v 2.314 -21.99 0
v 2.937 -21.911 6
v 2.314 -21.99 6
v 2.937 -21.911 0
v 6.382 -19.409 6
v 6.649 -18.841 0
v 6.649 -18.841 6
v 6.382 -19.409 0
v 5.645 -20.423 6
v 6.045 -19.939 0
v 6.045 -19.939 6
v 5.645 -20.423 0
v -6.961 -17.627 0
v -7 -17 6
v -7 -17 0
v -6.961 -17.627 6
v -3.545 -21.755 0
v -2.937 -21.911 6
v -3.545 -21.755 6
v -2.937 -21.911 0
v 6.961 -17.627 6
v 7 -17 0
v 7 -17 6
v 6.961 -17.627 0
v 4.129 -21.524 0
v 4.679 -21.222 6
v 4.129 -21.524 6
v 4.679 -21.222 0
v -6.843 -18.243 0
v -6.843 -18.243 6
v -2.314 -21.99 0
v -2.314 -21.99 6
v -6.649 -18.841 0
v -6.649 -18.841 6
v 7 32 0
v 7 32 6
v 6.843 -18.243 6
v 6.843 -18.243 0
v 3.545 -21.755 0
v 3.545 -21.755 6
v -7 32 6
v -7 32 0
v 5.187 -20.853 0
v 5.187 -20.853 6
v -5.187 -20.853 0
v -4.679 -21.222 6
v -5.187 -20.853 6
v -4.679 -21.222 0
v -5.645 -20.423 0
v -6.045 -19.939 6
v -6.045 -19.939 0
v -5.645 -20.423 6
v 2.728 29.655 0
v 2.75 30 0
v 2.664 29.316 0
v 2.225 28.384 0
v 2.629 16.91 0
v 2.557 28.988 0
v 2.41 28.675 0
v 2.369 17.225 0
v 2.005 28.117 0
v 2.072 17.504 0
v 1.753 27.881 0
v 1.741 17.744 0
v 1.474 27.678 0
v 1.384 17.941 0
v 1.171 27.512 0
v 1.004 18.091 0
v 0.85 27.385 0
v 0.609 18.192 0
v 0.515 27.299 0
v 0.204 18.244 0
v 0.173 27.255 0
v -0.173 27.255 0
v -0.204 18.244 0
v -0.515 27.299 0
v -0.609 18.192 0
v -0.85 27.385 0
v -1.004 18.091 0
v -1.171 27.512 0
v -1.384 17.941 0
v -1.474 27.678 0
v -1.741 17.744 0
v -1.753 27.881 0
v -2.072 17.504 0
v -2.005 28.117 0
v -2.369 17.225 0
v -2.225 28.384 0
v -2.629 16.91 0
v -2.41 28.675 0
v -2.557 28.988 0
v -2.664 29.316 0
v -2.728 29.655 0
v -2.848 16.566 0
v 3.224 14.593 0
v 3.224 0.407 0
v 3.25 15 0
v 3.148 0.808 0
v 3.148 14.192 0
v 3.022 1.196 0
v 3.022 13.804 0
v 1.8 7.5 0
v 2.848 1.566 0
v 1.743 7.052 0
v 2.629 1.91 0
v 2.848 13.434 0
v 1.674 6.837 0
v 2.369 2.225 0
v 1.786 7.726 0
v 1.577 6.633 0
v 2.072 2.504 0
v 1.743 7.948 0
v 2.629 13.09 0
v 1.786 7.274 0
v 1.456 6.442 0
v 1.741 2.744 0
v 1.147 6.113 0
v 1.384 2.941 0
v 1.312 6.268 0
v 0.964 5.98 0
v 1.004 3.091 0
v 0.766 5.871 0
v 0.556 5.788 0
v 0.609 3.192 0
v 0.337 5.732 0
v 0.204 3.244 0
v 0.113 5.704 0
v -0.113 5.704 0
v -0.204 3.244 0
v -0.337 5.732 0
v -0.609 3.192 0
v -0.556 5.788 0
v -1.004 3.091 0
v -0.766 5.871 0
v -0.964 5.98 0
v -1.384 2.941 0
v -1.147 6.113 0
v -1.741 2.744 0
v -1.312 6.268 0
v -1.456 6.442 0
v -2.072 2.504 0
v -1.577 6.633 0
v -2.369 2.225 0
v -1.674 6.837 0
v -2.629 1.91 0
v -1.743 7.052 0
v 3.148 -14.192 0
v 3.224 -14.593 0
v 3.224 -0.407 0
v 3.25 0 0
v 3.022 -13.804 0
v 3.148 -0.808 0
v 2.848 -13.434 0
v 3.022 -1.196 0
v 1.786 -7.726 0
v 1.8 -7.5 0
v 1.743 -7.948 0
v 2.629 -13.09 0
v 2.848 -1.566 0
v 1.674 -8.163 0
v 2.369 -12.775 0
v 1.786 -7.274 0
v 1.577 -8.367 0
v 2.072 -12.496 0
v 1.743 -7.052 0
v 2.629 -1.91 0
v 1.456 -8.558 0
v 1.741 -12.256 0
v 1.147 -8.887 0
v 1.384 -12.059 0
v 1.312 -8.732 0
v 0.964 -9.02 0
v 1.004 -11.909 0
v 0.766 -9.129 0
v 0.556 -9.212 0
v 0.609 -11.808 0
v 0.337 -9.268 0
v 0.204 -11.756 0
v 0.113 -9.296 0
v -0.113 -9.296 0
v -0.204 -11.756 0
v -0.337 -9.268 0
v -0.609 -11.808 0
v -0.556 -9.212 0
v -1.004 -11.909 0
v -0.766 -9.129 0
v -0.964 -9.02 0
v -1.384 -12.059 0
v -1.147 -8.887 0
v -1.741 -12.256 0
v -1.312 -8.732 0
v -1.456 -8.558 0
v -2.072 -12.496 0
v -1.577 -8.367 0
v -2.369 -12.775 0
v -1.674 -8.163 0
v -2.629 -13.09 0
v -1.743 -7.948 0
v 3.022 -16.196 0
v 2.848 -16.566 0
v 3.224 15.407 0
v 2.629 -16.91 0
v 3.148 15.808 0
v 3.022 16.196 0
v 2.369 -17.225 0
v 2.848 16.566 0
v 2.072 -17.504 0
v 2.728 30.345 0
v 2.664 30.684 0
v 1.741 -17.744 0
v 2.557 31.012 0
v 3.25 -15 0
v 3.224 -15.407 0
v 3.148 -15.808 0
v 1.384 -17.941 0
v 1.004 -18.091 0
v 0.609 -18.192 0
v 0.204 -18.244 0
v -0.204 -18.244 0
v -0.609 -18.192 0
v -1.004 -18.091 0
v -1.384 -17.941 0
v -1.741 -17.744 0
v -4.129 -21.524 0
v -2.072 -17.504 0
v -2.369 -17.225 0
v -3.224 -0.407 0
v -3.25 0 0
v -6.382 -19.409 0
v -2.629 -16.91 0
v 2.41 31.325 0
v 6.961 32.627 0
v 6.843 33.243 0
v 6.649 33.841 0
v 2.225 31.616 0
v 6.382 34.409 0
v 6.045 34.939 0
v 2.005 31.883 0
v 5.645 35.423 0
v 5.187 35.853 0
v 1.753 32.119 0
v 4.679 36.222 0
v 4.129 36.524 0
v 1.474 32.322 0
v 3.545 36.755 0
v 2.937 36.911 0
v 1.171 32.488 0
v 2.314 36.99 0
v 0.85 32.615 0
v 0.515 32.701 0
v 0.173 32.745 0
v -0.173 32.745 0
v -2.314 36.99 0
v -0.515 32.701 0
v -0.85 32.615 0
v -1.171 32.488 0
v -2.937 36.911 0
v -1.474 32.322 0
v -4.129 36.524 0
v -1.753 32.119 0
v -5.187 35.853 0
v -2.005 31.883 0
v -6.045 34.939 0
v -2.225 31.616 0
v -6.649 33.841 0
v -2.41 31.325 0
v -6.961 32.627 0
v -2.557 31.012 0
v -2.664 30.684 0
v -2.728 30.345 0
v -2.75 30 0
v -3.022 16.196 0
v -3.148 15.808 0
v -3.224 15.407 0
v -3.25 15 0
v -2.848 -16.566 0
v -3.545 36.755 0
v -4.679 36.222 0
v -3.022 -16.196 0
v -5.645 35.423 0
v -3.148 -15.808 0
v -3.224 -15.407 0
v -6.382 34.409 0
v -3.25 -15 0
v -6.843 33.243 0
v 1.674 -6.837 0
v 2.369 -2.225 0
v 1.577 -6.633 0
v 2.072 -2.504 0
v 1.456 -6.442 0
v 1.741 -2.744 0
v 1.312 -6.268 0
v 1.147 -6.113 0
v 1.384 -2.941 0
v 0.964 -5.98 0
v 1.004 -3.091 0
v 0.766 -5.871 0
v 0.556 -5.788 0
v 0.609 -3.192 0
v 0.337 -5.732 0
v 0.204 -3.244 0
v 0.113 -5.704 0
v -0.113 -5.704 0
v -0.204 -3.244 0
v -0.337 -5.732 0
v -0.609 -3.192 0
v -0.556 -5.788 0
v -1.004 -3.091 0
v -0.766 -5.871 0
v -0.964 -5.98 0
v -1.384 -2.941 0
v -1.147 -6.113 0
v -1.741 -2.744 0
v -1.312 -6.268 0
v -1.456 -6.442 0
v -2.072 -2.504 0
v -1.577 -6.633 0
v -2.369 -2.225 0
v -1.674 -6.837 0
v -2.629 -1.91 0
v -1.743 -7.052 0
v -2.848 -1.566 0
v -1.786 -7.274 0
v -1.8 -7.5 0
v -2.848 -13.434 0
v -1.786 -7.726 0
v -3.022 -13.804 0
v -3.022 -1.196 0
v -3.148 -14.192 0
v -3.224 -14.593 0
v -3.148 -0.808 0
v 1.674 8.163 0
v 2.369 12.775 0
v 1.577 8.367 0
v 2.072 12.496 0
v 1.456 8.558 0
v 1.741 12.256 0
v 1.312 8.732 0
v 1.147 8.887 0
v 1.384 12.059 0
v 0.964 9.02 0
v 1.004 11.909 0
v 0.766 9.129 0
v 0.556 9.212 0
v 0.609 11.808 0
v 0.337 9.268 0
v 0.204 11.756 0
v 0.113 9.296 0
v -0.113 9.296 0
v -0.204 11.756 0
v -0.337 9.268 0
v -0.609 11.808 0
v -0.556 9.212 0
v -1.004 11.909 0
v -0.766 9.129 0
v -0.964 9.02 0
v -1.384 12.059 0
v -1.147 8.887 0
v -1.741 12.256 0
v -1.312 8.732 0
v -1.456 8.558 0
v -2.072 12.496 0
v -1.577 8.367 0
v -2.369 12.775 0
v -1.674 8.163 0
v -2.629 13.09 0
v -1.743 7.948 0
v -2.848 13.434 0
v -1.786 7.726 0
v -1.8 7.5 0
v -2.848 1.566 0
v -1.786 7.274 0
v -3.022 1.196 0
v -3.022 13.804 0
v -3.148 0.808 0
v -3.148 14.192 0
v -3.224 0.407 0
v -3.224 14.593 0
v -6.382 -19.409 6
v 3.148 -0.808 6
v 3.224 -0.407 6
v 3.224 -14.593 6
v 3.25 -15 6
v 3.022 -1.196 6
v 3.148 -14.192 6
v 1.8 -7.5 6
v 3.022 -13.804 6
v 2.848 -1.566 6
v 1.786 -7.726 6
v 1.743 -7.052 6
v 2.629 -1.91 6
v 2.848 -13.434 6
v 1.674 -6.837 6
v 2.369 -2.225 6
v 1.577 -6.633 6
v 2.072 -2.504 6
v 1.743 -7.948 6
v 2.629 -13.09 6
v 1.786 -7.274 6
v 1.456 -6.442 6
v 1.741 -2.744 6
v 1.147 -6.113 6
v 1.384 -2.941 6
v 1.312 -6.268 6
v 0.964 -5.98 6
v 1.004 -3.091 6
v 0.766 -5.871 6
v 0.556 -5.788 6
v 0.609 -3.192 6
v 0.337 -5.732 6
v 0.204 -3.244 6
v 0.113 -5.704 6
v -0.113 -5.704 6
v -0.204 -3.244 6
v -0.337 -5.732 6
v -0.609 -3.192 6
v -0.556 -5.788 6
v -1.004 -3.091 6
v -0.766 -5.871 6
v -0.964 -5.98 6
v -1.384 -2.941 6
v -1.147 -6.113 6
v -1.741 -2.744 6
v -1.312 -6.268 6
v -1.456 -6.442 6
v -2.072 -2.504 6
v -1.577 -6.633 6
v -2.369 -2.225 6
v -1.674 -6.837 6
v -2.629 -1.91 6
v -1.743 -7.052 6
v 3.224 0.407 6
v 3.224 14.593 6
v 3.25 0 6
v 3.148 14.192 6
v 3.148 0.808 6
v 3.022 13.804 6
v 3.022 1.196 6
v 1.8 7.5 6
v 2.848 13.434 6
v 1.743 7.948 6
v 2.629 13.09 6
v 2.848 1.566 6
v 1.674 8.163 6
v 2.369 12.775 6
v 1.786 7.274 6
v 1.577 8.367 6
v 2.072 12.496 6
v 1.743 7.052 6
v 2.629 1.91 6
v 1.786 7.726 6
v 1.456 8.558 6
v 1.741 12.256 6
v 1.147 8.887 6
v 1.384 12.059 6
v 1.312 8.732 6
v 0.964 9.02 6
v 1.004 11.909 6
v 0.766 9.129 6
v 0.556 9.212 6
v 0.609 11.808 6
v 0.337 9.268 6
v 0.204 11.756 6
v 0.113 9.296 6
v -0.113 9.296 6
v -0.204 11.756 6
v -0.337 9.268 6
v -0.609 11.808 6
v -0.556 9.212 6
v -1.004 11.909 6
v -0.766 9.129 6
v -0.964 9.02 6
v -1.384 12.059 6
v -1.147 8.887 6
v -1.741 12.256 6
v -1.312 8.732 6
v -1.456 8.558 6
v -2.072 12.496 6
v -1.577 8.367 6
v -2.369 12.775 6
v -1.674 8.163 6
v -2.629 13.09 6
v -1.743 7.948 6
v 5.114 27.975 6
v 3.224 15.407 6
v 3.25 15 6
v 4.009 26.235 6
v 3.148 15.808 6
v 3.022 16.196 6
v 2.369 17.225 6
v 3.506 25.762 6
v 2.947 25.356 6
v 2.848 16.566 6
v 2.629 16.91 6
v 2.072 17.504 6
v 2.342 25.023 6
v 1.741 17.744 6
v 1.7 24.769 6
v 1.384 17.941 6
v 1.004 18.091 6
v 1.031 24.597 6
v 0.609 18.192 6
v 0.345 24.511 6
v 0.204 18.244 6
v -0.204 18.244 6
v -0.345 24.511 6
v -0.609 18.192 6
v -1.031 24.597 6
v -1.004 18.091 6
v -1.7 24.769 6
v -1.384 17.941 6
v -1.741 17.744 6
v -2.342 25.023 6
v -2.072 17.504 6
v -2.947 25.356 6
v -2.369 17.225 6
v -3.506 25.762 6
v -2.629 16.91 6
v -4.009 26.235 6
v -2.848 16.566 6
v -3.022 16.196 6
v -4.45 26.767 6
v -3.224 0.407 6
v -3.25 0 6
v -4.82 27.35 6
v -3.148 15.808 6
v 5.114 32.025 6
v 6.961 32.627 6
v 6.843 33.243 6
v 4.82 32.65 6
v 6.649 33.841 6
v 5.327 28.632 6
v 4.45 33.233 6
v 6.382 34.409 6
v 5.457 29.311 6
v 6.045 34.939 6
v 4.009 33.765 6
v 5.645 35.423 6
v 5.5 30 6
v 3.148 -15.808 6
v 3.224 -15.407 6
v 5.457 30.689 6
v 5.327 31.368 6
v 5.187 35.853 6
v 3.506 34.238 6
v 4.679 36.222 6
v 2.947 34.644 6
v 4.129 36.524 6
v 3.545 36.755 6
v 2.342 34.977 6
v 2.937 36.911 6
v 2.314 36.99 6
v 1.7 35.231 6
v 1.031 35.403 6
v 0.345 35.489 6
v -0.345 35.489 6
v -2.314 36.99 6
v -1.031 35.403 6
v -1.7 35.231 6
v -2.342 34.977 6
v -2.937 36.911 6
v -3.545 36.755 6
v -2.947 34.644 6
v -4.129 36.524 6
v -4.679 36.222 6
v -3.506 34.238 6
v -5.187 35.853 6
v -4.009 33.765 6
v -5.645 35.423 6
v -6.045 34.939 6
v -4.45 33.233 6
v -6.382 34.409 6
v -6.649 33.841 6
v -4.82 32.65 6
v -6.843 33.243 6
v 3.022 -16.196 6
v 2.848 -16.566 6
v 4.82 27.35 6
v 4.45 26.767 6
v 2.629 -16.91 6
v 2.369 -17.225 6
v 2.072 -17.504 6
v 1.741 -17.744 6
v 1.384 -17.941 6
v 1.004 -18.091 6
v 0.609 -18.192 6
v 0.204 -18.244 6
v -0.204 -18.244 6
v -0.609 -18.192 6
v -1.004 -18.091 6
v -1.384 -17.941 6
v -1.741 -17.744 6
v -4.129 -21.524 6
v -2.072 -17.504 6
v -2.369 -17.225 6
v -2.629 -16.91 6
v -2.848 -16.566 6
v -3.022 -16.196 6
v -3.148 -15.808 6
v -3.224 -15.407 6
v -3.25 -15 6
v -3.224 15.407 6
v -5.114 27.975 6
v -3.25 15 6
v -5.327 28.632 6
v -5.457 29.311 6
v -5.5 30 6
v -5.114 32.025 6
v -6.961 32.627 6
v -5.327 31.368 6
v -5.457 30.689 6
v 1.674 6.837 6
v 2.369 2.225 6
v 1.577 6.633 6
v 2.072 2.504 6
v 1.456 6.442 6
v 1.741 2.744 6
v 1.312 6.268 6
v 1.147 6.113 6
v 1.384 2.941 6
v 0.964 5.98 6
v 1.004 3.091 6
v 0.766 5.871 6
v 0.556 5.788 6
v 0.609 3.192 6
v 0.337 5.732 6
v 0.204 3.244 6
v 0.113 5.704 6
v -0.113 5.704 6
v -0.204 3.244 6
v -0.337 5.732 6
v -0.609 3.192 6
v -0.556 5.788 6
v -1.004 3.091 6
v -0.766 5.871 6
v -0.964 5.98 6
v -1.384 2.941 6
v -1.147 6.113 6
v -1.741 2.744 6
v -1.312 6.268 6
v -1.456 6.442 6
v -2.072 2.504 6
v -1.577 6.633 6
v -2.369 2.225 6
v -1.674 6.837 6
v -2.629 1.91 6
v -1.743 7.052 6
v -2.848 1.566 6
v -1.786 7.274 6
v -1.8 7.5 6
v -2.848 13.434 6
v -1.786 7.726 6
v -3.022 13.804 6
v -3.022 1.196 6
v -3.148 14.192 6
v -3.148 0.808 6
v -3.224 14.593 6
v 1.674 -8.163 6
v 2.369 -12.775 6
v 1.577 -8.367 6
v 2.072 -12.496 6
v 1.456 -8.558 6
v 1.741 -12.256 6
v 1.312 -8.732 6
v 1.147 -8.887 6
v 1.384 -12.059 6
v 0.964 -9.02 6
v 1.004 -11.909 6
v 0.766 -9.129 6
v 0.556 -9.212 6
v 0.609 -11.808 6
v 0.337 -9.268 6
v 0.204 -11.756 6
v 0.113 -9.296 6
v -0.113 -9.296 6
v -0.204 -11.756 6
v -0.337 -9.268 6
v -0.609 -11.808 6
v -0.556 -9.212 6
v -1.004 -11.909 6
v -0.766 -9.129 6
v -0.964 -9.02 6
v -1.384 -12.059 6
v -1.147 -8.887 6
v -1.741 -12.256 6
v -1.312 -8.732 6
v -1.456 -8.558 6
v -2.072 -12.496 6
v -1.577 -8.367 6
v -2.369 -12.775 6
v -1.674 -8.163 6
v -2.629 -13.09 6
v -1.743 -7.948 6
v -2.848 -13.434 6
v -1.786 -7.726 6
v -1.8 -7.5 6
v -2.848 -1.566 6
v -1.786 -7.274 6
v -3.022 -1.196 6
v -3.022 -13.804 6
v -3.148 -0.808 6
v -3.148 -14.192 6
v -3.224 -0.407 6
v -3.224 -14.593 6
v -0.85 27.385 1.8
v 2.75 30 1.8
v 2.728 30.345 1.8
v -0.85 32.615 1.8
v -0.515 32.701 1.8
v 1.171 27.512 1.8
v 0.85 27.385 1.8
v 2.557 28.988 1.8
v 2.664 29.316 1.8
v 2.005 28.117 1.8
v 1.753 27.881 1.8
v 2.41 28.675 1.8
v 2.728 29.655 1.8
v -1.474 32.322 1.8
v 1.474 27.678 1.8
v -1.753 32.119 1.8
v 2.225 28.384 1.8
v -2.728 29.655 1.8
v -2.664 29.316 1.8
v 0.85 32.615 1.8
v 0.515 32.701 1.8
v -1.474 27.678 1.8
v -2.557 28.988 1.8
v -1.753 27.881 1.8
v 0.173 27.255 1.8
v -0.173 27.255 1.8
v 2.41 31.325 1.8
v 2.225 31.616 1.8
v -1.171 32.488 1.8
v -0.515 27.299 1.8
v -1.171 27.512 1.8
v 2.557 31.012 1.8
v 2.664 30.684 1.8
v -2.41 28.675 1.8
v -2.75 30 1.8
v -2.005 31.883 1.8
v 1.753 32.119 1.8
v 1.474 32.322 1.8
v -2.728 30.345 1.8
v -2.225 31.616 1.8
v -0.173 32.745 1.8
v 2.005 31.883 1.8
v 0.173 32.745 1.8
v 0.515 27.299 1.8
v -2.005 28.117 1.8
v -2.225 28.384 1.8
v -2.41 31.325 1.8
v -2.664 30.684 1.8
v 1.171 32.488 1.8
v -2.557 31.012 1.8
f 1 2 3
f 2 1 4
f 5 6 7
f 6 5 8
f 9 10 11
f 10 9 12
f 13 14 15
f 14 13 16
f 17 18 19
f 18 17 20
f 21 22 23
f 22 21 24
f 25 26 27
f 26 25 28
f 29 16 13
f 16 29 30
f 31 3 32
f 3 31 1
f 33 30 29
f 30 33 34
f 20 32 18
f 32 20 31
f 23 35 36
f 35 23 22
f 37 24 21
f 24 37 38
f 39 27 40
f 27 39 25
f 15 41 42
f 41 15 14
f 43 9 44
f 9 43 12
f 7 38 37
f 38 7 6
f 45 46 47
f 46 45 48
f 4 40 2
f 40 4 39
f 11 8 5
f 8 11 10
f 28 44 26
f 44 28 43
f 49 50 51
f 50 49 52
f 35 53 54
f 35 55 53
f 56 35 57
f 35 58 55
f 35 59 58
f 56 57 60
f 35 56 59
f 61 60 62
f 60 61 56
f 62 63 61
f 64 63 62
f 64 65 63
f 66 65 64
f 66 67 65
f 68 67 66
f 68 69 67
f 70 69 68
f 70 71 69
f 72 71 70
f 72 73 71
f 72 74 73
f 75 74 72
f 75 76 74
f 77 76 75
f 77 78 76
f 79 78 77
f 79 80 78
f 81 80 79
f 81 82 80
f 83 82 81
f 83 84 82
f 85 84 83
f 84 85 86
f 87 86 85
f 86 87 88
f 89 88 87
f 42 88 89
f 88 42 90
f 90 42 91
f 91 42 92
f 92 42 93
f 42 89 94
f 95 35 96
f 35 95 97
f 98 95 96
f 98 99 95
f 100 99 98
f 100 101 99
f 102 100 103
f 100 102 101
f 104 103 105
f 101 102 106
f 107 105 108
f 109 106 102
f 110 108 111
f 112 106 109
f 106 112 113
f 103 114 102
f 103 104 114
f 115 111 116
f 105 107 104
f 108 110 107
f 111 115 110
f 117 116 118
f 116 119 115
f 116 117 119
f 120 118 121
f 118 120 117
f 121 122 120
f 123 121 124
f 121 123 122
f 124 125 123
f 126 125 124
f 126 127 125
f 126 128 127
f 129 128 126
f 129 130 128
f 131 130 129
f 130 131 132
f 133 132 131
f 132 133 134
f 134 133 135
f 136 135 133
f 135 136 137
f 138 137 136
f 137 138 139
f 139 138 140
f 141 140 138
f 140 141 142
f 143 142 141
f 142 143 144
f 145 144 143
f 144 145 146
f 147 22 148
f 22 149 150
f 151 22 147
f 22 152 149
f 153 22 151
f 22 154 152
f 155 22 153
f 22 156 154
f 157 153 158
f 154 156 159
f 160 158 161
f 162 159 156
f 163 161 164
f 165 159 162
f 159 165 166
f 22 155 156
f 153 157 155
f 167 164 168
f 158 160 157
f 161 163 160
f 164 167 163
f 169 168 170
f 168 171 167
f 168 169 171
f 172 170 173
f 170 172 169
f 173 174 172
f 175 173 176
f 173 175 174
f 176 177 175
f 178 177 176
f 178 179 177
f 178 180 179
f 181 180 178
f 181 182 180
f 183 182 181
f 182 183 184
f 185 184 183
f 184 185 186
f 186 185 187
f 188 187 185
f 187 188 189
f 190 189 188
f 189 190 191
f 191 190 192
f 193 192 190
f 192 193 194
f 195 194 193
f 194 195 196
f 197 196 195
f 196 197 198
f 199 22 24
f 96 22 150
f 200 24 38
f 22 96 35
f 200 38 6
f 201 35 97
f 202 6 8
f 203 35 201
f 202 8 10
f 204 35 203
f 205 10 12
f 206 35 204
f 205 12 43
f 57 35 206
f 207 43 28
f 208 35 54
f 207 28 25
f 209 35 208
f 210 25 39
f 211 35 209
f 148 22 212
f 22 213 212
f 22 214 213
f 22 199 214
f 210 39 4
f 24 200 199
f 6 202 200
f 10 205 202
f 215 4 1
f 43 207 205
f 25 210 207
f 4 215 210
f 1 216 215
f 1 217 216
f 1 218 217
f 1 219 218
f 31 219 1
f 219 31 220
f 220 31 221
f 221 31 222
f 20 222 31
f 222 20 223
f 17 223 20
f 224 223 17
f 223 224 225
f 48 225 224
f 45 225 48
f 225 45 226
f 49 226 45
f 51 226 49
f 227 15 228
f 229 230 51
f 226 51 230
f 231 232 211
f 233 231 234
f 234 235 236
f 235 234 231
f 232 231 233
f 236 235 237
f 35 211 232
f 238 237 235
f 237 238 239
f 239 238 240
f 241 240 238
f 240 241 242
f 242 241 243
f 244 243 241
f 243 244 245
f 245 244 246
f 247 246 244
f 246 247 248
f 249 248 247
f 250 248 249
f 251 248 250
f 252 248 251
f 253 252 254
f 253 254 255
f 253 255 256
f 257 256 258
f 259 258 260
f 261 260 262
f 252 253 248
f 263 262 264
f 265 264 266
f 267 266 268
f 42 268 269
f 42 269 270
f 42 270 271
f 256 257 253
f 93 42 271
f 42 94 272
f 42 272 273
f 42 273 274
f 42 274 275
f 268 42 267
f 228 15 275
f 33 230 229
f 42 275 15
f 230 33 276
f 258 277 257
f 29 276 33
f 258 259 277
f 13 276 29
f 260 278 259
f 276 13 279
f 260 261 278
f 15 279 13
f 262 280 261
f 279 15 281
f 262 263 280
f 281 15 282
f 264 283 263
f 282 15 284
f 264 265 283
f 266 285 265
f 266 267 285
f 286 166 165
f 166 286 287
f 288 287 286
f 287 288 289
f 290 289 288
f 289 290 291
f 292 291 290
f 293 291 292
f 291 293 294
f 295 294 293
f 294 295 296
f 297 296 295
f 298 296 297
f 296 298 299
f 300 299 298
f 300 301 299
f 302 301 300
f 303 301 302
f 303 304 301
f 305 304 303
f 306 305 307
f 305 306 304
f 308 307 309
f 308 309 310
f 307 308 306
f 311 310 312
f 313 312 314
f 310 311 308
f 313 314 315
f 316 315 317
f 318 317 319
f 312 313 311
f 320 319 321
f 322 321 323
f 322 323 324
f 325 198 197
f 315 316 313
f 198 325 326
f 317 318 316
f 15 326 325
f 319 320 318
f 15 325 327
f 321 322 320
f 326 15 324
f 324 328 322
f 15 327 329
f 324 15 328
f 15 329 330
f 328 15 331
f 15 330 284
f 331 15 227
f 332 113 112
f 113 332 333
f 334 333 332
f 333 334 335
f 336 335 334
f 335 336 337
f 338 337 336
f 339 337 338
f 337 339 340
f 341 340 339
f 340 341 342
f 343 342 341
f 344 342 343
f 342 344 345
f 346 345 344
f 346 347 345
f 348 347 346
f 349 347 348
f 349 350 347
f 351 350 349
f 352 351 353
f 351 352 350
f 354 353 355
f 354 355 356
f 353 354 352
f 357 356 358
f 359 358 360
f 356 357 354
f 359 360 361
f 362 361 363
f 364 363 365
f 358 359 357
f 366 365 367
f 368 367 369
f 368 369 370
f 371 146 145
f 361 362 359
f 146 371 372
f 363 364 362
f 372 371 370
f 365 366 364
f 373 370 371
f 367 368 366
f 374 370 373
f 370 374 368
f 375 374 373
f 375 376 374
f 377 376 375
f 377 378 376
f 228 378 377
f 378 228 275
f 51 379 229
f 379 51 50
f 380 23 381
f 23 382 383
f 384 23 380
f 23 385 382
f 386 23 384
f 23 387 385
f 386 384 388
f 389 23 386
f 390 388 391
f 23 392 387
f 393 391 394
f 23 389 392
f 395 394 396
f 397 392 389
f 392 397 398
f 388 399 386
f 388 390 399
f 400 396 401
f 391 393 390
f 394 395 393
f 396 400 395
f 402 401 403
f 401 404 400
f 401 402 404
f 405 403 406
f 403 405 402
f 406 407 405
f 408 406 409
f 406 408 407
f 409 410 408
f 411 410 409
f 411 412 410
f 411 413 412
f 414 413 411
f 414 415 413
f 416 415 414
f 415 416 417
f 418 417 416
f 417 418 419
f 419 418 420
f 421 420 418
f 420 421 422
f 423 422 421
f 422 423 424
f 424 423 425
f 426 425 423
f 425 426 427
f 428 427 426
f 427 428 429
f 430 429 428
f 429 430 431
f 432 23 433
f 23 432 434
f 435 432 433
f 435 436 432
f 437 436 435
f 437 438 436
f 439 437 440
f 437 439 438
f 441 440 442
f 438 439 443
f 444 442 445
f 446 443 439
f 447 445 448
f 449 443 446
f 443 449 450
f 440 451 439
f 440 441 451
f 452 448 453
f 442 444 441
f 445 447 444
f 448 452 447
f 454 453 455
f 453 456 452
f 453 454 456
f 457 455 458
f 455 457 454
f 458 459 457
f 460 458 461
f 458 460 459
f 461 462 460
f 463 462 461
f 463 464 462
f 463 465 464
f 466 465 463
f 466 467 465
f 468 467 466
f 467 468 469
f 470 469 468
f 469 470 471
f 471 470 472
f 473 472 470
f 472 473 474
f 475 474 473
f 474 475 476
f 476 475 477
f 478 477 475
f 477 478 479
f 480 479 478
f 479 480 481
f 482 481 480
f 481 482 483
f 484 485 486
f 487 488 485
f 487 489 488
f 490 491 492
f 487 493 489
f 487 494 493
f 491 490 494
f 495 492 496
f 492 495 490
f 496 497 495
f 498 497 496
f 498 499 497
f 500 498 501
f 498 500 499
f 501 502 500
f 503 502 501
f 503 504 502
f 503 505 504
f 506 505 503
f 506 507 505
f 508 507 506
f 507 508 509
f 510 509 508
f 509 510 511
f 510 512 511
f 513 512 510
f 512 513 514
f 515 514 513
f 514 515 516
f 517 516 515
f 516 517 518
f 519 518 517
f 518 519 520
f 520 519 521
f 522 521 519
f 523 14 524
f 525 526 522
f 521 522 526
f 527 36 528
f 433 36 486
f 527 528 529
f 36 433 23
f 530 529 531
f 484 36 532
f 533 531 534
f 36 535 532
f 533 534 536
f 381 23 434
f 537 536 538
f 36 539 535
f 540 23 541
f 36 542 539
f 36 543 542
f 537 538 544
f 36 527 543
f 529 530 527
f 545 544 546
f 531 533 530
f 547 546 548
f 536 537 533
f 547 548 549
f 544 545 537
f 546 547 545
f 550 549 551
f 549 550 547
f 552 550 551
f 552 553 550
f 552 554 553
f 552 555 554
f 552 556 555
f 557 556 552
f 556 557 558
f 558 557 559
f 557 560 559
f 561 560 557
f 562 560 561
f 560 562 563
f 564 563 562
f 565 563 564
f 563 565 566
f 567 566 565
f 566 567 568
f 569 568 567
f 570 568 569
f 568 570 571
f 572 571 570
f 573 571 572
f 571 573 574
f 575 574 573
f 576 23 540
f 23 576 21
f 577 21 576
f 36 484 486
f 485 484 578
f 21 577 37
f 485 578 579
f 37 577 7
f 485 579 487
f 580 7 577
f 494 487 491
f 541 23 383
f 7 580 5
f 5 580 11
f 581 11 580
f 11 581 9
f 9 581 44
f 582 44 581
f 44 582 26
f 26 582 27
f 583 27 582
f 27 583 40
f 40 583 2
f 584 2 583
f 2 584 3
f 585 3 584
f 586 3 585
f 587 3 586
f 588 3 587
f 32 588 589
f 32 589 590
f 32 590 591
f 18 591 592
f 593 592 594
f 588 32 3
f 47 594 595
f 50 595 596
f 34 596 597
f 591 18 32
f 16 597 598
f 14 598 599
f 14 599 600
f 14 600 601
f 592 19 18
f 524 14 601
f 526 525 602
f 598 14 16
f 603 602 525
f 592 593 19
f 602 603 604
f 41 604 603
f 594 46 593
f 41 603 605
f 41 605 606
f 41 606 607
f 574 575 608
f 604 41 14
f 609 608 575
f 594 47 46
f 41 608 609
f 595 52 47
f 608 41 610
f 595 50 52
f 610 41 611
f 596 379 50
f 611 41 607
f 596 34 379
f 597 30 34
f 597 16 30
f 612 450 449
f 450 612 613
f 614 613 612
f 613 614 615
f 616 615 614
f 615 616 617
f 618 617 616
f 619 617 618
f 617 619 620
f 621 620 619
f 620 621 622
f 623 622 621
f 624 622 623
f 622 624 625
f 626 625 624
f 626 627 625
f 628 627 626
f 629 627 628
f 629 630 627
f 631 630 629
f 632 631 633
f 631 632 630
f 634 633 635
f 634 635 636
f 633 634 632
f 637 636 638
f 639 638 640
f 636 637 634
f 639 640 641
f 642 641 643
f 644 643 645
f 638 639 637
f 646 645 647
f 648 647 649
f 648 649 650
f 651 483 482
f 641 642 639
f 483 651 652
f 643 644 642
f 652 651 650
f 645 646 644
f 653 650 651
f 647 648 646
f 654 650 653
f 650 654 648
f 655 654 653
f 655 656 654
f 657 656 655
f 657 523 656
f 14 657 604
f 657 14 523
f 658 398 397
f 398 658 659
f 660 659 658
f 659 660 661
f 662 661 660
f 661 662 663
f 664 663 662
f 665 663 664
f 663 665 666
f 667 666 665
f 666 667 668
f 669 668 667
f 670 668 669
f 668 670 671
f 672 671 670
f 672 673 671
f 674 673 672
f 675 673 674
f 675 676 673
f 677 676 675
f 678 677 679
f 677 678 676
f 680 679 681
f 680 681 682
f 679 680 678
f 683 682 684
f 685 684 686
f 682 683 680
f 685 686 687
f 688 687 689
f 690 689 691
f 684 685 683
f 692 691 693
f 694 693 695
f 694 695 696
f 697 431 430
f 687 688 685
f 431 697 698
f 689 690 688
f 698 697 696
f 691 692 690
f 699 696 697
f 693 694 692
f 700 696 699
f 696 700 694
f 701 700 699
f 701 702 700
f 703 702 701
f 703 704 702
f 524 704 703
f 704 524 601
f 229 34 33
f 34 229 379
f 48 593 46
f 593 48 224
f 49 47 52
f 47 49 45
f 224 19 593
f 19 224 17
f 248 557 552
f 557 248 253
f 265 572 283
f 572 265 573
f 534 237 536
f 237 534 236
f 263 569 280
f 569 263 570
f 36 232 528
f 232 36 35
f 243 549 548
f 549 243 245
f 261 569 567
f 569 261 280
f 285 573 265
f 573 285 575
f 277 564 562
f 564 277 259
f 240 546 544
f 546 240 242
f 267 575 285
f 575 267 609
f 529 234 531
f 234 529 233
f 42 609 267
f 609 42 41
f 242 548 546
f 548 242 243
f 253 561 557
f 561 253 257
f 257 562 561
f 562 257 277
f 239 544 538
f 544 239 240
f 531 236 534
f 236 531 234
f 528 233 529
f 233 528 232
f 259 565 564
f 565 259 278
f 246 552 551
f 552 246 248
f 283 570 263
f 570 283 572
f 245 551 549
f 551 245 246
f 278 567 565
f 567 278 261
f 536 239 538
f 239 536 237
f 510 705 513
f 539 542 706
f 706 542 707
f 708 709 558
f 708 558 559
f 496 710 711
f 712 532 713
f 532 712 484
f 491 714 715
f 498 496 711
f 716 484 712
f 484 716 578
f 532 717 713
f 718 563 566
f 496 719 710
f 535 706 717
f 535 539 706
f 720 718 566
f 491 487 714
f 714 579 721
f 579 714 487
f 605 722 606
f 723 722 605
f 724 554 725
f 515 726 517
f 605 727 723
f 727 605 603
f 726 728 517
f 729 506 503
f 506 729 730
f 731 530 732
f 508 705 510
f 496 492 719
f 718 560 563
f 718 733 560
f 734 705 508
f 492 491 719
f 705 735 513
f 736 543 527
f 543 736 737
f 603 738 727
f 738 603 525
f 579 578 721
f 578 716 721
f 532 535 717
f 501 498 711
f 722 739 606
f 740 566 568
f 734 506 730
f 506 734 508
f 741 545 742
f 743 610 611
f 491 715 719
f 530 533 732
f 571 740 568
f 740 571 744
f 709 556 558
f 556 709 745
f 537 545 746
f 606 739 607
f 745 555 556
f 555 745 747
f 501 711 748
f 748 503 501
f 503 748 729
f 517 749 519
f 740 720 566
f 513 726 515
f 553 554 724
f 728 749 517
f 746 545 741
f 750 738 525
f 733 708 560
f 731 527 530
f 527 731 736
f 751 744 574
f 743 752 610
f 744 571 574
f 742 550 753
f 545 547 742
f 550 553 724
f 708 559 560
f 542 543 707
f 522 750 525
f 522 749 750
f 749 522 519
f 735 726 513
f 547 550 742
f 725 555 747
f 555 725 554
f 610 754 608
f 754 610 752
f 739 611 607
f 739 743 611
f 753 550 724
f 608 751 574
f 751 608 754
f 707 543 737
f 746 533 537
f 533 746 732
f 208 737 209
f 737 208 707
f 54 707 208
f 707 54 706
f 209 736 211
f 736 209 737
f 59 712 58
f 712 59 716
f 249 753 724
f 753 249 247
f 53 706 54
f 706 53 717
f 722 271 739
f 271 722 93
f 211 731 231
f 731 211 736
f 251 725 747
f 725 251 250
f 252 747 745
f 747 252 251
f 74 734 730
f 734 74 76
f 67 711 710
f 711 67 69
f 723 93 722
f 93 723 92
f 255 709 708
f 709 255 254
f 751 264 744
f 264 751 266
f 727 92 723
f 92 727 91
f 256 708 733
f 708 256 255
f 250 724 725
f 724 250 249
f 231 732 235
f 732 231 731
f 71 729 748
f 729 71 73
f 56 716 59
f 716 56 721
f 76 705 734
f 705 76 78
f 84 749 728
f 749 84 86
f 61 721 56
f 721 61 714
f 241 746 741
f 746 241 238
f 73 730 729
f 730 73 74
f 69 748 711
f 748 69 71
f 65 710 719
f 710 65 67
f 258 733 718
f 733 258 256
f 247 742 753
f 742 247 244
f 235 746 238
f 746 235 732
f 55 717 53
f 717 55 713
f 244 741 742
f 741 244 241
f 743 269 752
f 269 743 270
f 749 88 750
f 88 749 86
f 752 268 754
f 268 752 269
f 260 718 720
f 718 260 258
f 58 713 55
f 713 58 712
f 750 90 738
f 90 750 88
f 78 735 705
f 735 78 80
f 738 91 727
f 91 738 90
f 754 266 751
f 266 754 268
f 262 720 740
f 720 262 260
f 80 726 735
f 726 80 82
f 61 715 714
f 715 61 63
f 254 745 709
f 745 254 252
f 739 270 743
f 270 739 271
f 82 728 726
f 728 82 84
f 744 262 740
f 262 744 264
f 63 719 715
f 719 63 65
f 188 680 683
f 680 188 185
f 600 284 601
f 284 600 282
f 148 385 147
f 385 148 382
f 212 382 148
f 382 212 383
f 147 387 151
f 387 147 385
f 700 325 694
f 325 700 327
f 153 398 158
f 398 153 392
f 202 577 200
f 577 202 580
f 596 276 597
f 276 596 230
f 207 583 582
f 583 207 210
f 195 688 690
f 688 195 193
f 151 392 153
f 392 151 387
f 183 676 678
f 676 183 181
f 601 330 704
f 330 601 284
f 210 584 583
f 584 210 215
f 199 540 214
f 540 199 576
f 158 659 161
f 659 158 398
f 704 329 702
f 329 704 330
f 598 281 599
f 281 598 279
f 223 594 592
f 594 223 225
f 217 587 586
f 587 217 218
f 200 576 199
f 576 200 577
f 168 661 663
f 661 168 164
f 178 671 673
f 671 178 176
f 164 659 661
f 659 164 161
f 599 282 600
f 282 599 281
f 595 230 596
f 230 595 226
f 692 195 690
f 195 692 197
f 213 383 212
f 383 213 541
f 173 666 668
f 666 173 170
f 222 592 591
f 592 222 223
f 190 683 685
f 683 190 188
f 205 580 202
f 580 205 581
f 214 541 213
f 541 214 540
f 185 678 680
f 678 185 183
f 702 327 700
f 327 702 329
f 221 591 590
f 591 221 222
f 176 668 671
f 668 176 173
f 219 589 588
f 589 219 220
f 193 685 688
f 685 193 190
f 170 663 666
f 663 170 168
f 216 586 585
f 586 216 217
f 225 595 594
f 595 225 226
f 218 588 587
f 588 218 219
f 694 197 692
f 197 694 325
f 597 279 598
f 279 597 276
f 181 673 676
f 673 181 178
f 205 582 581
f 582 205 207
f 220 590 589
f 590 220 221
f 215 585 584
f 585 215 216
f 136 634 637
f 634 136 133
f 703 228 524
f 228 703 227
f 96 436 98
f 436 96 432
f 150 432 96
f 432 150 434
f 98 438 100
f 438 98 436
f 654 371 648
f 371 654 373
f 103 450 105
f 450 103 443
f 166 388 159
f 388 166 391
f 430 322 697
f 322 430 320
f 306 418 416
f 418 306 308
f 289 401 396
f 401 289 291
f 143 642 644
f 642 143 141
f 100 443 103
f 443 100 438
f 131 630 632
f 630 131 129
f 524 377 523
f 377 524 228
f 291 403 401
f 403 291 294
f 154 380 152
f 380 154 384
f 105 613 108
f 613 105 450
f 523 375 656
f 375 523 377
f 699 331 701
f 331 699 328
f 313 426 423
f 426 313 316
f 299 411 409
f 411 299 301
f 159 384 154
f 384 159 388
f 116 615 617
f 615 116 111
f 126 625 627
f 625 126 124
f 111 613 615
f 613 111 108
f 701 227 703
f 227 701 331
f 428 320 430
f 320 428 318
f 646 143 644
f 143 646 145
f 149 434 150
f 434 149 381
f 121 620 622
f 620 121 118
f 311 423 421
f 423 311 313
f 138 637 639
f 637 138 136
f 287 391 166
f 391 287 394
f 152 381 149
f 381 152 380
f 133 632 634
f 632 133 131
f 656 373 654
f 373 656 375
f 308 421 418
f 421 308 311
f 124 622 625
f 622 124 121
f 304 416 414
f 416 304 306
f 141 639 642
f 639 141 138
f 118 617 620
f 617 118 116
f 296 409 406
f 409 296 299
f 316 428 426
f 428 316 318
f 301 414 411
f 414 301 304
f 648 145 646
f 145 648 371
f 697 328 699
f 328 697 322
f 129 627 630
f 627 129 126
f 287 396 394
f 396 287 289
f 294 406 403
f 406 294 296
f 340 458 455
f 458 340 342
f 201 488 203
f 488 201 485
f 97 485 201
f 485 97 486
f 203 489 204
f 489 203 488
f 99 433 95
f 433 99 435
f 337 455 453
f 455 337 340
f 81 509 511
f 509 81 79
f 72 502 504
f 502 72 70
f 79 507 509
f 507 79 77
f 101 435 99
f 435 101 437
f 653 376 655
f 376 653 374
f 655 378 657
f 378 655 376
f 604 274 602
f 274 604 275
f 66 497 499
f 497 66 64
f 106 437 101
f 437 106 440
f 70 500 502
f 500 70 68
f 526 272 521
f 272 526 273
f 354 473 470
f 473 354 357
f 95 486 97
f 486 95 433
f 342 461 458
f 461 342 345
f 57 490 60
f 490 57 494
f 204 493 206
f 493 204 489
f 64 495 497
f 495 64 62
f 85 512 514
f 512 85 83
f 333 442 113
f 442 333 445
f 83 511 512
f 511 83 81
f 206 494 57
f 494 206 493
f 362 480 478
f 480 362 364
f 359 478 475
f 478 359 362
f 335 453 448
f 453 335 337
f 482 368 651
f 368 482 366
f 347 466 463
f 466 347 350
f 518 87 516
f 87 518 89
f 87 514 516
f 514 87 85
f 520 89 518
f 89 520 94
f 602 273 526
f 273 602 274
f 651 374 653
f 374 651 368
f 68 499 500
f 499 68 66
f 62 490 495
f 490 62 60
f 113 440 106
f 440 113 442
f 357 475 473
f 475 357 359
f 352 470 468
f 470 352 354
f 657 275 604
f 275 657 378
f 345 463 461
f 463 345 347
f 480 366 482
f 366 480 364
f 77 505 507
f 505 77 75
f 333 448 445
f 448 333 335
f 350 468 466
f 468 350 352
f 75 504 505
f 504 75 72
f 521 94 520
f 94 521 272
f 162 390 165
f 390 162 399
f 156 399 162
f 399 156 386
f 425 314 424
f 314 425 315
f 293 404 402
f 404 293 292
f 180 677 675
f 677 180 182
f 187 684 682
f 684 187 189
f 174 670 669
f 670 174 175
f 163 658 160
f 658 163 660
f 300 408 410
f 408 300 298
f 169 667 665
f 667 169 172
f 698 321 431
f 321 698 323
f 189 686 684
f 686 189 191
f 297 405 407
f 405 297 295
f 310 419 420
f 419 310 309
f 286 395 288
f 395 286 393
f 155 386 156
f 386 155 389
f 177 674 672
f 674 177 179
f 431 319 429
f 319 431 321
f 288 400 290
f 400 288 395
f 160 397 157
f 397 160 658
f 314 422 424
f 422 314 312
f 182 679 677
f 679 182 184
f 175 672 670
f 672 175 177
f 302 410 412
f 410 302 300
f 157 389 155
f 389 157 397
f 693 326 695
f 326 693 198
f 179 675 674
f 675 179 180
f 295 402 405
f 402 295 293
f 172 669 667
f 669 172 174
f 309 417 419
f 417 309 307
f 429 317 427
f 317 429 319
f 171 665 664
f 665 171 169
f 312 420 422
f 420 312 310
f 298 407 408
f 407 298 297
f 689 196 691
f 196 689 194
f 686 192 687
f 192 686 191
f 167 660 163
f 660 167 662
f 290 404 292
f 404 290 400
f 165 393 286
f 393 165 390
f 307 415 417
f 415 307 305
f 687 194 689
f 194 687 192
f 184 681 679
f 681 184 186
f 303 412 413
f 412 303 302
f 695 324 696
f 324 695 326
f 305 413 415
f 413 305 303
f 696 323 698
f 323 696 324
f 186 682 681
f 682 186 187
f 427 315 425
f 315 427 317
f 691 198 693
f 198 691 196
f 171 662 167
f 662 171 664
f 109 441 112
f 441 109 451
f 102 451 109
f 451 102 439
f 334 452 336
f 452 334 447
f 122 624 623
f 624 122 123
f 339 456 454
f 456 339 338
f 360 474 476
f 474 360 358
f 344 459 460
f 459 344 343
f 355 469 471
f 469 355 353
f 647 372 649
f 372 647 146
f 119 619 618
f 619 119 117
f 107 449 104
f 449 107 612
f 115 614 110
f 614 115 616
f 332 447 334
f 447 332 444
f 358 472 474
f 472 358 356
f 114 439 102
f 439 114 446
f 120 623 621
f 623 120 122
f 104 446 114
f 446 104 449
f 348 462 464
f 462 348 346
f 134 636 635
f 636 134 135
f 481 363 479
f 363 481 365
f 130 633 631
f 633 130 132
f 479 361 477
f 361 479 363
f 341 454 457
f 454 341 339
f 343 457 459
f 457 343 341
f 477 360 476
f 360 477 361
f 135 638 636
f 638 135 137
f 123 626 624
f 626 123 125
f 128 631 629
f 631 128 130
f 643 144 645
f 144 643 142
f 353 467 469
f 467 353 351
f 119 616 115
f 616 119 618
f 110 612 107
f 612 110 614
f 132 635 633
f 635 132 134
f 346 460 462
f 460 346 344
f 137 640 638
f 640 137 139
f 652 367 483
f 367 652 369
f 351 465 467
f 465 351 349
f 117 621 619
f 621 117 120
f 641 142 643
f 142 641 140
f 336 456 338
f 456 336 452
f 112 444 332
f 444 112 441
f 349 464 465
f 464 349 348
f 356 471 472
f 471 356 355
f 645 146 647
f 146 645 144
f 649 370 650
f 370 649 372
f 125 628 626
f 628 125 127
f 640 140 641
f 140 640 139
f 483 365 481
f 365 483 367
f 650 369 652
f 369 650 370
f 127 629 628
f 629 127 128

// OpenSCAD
$fn = 50;


difference() {
	union() {
		hull() {
			translate(v = [-2.0000000000, 17.0000000000, 0]) {
				cylinder(h = 6, r = 5);
			}
			translate(v = [2.0000000000, 17.0000000000, 0]) {
				cylinder(h = 6, r = 5);
			}
			translate(v = [-2.0000000000, -17.0000000000, 0]) {
				cylinder(h = 6, r = 5);
			}
			translate(v = [2.0000000000, -17.0000000000, 0]) {
				cylinder(h = 6, r = 5);
			}
		}
		translate(v = [0.0000000000, 22.5000000000, 0]) {
			hull() {
				translate(v = [-2.0000000000, 9.5000000000, 0]) {
					cylinder(h = 6, r = 5);
				}
				translate(v = [2.0000000000, 9.5000000000, 0]) {
					cylinder(h = 6, r = 5);
				}
				translate(v = [-2.0000000000, -9.5000000000, 0]) {
					cylinder(h = 6, r = 5);
				}
				translate(v = [2.0000000000, -9.5000000000, 0]) {
					cylinder(h = 6, r = 5);
				}
			}
		}
		translate(v = [0.0000000000, 22.5000000000, 0]) {
			hull() {
				translate(v = [-2.0000000000, 9.5000000000, 0]) {
					cylinder(h = 6, r = 5);
				}
				translate(v = [2.0000000000, 9.5000000000, 0]) {
					cylinder(h = 6, r = 5);
				}
				translate(v = [-2.0000000000, -9.5000000000, 0]) {
					cylinder(h = 6, r = 5);
				}
				translate(v = [2.0000000000, -9.5000000000, 0]) {
					cylinder(h = 6, r = 5);
				}
			}
		}
	}
	union() {
		translate(v = [0.0000000000, 30.0000000000, 6]) {
			rotate(a = [0, 0, 0]) {
				difference() {
					union() {
						#translate(v = [0, 0, -6.0000000000]) {
							cylinder(h = 6, r = 2.2500000000);
						}
						#translate(v = [0, 0, -4.2000000000]) {
							cylinder(h = 4.2000000000, r1 = 2.7500000000, r2 = 5.5000000000);
						}
						#translate(v = [0, 0, -6.0000000000]) {
							cylinder(h = 6, r = 2.7500000000);
						}
						#translate(v = [0, 0, -6.0000000000]) {
							cylinder(h = 6, r = 2.2500000000);
						}
					}
					union();
				}
			}
		}
		translate(v = [0.0000000000, 30.0000000000, 6]) {
			rotate(a = [0, 0, 0]) {
				difference() {
					union() {
						#translate(v = [0, 0, -6.0000000000]) {
							cylinder(h = 6, r = 2.2500000000);
						}
						#translate(v = [0, 0, -4.2000000000]) {
							cylinder(h = 4.2000000000, r1 = 2.7500000000, r2 = 5.5000000000);
						}
						#translate(v = [0, 0, -6.0000000000]) {
							cylinder(h = 6, r = 2.7500000000);
						}
						#translate(v = [0, 0, -6.0000000000]) {
							cylinder(h = 6, r = 2.2500000000);
						}
					}
					union();
				}
			}
		}
		translate(v = [0.0000000000, -15.0000000000, 0]) {
			translate(v = [0, 0, -100]) {
				cylinder(h = 200, r = 3.2500000000);
			}
		}
		translate(v = [0, 0, -100]) {
			cylinder(h = 200, r = 3.2500000000);
		}
		translate(v = [0.0000000000, 15.0000000000, 0]) {
			translate(v = [0, 0, -100]) {
				cylinder(h = 200, r = 3.2500000000);
			}
		}
		translate(v = [0.0000000000, -15.0000000000, 0]) {
			translate(v = [0, 0, -100]) {
				cylinder(h = 200, r = 1.8000000000);
			}
		}
		translate(v = [0.0000000000, -7.5000000000, 0]) {
			translate(v = [0, 0, -100]) {
				cylinder(h = 200, r = 1.8000000000);
			}
		}
		translate(v = [0, 0, -100]) {
			cylinder(h = 200, r = 1.8000000000);
		}
		translate(v = [0.0000000000, 7.5000000000, 0]) {
			translate(v = [0, 0, -100]) {
				cylinder(h = 200, r = 1.8000000000);
			}
		}
		translate(v = [0.0000000000, 15.0000000000, 0]) {
			translate(v = [0, 0, -100]) {
				cylinder(h = 200, r = 1.8000000000);
			}
		}
	}
}
